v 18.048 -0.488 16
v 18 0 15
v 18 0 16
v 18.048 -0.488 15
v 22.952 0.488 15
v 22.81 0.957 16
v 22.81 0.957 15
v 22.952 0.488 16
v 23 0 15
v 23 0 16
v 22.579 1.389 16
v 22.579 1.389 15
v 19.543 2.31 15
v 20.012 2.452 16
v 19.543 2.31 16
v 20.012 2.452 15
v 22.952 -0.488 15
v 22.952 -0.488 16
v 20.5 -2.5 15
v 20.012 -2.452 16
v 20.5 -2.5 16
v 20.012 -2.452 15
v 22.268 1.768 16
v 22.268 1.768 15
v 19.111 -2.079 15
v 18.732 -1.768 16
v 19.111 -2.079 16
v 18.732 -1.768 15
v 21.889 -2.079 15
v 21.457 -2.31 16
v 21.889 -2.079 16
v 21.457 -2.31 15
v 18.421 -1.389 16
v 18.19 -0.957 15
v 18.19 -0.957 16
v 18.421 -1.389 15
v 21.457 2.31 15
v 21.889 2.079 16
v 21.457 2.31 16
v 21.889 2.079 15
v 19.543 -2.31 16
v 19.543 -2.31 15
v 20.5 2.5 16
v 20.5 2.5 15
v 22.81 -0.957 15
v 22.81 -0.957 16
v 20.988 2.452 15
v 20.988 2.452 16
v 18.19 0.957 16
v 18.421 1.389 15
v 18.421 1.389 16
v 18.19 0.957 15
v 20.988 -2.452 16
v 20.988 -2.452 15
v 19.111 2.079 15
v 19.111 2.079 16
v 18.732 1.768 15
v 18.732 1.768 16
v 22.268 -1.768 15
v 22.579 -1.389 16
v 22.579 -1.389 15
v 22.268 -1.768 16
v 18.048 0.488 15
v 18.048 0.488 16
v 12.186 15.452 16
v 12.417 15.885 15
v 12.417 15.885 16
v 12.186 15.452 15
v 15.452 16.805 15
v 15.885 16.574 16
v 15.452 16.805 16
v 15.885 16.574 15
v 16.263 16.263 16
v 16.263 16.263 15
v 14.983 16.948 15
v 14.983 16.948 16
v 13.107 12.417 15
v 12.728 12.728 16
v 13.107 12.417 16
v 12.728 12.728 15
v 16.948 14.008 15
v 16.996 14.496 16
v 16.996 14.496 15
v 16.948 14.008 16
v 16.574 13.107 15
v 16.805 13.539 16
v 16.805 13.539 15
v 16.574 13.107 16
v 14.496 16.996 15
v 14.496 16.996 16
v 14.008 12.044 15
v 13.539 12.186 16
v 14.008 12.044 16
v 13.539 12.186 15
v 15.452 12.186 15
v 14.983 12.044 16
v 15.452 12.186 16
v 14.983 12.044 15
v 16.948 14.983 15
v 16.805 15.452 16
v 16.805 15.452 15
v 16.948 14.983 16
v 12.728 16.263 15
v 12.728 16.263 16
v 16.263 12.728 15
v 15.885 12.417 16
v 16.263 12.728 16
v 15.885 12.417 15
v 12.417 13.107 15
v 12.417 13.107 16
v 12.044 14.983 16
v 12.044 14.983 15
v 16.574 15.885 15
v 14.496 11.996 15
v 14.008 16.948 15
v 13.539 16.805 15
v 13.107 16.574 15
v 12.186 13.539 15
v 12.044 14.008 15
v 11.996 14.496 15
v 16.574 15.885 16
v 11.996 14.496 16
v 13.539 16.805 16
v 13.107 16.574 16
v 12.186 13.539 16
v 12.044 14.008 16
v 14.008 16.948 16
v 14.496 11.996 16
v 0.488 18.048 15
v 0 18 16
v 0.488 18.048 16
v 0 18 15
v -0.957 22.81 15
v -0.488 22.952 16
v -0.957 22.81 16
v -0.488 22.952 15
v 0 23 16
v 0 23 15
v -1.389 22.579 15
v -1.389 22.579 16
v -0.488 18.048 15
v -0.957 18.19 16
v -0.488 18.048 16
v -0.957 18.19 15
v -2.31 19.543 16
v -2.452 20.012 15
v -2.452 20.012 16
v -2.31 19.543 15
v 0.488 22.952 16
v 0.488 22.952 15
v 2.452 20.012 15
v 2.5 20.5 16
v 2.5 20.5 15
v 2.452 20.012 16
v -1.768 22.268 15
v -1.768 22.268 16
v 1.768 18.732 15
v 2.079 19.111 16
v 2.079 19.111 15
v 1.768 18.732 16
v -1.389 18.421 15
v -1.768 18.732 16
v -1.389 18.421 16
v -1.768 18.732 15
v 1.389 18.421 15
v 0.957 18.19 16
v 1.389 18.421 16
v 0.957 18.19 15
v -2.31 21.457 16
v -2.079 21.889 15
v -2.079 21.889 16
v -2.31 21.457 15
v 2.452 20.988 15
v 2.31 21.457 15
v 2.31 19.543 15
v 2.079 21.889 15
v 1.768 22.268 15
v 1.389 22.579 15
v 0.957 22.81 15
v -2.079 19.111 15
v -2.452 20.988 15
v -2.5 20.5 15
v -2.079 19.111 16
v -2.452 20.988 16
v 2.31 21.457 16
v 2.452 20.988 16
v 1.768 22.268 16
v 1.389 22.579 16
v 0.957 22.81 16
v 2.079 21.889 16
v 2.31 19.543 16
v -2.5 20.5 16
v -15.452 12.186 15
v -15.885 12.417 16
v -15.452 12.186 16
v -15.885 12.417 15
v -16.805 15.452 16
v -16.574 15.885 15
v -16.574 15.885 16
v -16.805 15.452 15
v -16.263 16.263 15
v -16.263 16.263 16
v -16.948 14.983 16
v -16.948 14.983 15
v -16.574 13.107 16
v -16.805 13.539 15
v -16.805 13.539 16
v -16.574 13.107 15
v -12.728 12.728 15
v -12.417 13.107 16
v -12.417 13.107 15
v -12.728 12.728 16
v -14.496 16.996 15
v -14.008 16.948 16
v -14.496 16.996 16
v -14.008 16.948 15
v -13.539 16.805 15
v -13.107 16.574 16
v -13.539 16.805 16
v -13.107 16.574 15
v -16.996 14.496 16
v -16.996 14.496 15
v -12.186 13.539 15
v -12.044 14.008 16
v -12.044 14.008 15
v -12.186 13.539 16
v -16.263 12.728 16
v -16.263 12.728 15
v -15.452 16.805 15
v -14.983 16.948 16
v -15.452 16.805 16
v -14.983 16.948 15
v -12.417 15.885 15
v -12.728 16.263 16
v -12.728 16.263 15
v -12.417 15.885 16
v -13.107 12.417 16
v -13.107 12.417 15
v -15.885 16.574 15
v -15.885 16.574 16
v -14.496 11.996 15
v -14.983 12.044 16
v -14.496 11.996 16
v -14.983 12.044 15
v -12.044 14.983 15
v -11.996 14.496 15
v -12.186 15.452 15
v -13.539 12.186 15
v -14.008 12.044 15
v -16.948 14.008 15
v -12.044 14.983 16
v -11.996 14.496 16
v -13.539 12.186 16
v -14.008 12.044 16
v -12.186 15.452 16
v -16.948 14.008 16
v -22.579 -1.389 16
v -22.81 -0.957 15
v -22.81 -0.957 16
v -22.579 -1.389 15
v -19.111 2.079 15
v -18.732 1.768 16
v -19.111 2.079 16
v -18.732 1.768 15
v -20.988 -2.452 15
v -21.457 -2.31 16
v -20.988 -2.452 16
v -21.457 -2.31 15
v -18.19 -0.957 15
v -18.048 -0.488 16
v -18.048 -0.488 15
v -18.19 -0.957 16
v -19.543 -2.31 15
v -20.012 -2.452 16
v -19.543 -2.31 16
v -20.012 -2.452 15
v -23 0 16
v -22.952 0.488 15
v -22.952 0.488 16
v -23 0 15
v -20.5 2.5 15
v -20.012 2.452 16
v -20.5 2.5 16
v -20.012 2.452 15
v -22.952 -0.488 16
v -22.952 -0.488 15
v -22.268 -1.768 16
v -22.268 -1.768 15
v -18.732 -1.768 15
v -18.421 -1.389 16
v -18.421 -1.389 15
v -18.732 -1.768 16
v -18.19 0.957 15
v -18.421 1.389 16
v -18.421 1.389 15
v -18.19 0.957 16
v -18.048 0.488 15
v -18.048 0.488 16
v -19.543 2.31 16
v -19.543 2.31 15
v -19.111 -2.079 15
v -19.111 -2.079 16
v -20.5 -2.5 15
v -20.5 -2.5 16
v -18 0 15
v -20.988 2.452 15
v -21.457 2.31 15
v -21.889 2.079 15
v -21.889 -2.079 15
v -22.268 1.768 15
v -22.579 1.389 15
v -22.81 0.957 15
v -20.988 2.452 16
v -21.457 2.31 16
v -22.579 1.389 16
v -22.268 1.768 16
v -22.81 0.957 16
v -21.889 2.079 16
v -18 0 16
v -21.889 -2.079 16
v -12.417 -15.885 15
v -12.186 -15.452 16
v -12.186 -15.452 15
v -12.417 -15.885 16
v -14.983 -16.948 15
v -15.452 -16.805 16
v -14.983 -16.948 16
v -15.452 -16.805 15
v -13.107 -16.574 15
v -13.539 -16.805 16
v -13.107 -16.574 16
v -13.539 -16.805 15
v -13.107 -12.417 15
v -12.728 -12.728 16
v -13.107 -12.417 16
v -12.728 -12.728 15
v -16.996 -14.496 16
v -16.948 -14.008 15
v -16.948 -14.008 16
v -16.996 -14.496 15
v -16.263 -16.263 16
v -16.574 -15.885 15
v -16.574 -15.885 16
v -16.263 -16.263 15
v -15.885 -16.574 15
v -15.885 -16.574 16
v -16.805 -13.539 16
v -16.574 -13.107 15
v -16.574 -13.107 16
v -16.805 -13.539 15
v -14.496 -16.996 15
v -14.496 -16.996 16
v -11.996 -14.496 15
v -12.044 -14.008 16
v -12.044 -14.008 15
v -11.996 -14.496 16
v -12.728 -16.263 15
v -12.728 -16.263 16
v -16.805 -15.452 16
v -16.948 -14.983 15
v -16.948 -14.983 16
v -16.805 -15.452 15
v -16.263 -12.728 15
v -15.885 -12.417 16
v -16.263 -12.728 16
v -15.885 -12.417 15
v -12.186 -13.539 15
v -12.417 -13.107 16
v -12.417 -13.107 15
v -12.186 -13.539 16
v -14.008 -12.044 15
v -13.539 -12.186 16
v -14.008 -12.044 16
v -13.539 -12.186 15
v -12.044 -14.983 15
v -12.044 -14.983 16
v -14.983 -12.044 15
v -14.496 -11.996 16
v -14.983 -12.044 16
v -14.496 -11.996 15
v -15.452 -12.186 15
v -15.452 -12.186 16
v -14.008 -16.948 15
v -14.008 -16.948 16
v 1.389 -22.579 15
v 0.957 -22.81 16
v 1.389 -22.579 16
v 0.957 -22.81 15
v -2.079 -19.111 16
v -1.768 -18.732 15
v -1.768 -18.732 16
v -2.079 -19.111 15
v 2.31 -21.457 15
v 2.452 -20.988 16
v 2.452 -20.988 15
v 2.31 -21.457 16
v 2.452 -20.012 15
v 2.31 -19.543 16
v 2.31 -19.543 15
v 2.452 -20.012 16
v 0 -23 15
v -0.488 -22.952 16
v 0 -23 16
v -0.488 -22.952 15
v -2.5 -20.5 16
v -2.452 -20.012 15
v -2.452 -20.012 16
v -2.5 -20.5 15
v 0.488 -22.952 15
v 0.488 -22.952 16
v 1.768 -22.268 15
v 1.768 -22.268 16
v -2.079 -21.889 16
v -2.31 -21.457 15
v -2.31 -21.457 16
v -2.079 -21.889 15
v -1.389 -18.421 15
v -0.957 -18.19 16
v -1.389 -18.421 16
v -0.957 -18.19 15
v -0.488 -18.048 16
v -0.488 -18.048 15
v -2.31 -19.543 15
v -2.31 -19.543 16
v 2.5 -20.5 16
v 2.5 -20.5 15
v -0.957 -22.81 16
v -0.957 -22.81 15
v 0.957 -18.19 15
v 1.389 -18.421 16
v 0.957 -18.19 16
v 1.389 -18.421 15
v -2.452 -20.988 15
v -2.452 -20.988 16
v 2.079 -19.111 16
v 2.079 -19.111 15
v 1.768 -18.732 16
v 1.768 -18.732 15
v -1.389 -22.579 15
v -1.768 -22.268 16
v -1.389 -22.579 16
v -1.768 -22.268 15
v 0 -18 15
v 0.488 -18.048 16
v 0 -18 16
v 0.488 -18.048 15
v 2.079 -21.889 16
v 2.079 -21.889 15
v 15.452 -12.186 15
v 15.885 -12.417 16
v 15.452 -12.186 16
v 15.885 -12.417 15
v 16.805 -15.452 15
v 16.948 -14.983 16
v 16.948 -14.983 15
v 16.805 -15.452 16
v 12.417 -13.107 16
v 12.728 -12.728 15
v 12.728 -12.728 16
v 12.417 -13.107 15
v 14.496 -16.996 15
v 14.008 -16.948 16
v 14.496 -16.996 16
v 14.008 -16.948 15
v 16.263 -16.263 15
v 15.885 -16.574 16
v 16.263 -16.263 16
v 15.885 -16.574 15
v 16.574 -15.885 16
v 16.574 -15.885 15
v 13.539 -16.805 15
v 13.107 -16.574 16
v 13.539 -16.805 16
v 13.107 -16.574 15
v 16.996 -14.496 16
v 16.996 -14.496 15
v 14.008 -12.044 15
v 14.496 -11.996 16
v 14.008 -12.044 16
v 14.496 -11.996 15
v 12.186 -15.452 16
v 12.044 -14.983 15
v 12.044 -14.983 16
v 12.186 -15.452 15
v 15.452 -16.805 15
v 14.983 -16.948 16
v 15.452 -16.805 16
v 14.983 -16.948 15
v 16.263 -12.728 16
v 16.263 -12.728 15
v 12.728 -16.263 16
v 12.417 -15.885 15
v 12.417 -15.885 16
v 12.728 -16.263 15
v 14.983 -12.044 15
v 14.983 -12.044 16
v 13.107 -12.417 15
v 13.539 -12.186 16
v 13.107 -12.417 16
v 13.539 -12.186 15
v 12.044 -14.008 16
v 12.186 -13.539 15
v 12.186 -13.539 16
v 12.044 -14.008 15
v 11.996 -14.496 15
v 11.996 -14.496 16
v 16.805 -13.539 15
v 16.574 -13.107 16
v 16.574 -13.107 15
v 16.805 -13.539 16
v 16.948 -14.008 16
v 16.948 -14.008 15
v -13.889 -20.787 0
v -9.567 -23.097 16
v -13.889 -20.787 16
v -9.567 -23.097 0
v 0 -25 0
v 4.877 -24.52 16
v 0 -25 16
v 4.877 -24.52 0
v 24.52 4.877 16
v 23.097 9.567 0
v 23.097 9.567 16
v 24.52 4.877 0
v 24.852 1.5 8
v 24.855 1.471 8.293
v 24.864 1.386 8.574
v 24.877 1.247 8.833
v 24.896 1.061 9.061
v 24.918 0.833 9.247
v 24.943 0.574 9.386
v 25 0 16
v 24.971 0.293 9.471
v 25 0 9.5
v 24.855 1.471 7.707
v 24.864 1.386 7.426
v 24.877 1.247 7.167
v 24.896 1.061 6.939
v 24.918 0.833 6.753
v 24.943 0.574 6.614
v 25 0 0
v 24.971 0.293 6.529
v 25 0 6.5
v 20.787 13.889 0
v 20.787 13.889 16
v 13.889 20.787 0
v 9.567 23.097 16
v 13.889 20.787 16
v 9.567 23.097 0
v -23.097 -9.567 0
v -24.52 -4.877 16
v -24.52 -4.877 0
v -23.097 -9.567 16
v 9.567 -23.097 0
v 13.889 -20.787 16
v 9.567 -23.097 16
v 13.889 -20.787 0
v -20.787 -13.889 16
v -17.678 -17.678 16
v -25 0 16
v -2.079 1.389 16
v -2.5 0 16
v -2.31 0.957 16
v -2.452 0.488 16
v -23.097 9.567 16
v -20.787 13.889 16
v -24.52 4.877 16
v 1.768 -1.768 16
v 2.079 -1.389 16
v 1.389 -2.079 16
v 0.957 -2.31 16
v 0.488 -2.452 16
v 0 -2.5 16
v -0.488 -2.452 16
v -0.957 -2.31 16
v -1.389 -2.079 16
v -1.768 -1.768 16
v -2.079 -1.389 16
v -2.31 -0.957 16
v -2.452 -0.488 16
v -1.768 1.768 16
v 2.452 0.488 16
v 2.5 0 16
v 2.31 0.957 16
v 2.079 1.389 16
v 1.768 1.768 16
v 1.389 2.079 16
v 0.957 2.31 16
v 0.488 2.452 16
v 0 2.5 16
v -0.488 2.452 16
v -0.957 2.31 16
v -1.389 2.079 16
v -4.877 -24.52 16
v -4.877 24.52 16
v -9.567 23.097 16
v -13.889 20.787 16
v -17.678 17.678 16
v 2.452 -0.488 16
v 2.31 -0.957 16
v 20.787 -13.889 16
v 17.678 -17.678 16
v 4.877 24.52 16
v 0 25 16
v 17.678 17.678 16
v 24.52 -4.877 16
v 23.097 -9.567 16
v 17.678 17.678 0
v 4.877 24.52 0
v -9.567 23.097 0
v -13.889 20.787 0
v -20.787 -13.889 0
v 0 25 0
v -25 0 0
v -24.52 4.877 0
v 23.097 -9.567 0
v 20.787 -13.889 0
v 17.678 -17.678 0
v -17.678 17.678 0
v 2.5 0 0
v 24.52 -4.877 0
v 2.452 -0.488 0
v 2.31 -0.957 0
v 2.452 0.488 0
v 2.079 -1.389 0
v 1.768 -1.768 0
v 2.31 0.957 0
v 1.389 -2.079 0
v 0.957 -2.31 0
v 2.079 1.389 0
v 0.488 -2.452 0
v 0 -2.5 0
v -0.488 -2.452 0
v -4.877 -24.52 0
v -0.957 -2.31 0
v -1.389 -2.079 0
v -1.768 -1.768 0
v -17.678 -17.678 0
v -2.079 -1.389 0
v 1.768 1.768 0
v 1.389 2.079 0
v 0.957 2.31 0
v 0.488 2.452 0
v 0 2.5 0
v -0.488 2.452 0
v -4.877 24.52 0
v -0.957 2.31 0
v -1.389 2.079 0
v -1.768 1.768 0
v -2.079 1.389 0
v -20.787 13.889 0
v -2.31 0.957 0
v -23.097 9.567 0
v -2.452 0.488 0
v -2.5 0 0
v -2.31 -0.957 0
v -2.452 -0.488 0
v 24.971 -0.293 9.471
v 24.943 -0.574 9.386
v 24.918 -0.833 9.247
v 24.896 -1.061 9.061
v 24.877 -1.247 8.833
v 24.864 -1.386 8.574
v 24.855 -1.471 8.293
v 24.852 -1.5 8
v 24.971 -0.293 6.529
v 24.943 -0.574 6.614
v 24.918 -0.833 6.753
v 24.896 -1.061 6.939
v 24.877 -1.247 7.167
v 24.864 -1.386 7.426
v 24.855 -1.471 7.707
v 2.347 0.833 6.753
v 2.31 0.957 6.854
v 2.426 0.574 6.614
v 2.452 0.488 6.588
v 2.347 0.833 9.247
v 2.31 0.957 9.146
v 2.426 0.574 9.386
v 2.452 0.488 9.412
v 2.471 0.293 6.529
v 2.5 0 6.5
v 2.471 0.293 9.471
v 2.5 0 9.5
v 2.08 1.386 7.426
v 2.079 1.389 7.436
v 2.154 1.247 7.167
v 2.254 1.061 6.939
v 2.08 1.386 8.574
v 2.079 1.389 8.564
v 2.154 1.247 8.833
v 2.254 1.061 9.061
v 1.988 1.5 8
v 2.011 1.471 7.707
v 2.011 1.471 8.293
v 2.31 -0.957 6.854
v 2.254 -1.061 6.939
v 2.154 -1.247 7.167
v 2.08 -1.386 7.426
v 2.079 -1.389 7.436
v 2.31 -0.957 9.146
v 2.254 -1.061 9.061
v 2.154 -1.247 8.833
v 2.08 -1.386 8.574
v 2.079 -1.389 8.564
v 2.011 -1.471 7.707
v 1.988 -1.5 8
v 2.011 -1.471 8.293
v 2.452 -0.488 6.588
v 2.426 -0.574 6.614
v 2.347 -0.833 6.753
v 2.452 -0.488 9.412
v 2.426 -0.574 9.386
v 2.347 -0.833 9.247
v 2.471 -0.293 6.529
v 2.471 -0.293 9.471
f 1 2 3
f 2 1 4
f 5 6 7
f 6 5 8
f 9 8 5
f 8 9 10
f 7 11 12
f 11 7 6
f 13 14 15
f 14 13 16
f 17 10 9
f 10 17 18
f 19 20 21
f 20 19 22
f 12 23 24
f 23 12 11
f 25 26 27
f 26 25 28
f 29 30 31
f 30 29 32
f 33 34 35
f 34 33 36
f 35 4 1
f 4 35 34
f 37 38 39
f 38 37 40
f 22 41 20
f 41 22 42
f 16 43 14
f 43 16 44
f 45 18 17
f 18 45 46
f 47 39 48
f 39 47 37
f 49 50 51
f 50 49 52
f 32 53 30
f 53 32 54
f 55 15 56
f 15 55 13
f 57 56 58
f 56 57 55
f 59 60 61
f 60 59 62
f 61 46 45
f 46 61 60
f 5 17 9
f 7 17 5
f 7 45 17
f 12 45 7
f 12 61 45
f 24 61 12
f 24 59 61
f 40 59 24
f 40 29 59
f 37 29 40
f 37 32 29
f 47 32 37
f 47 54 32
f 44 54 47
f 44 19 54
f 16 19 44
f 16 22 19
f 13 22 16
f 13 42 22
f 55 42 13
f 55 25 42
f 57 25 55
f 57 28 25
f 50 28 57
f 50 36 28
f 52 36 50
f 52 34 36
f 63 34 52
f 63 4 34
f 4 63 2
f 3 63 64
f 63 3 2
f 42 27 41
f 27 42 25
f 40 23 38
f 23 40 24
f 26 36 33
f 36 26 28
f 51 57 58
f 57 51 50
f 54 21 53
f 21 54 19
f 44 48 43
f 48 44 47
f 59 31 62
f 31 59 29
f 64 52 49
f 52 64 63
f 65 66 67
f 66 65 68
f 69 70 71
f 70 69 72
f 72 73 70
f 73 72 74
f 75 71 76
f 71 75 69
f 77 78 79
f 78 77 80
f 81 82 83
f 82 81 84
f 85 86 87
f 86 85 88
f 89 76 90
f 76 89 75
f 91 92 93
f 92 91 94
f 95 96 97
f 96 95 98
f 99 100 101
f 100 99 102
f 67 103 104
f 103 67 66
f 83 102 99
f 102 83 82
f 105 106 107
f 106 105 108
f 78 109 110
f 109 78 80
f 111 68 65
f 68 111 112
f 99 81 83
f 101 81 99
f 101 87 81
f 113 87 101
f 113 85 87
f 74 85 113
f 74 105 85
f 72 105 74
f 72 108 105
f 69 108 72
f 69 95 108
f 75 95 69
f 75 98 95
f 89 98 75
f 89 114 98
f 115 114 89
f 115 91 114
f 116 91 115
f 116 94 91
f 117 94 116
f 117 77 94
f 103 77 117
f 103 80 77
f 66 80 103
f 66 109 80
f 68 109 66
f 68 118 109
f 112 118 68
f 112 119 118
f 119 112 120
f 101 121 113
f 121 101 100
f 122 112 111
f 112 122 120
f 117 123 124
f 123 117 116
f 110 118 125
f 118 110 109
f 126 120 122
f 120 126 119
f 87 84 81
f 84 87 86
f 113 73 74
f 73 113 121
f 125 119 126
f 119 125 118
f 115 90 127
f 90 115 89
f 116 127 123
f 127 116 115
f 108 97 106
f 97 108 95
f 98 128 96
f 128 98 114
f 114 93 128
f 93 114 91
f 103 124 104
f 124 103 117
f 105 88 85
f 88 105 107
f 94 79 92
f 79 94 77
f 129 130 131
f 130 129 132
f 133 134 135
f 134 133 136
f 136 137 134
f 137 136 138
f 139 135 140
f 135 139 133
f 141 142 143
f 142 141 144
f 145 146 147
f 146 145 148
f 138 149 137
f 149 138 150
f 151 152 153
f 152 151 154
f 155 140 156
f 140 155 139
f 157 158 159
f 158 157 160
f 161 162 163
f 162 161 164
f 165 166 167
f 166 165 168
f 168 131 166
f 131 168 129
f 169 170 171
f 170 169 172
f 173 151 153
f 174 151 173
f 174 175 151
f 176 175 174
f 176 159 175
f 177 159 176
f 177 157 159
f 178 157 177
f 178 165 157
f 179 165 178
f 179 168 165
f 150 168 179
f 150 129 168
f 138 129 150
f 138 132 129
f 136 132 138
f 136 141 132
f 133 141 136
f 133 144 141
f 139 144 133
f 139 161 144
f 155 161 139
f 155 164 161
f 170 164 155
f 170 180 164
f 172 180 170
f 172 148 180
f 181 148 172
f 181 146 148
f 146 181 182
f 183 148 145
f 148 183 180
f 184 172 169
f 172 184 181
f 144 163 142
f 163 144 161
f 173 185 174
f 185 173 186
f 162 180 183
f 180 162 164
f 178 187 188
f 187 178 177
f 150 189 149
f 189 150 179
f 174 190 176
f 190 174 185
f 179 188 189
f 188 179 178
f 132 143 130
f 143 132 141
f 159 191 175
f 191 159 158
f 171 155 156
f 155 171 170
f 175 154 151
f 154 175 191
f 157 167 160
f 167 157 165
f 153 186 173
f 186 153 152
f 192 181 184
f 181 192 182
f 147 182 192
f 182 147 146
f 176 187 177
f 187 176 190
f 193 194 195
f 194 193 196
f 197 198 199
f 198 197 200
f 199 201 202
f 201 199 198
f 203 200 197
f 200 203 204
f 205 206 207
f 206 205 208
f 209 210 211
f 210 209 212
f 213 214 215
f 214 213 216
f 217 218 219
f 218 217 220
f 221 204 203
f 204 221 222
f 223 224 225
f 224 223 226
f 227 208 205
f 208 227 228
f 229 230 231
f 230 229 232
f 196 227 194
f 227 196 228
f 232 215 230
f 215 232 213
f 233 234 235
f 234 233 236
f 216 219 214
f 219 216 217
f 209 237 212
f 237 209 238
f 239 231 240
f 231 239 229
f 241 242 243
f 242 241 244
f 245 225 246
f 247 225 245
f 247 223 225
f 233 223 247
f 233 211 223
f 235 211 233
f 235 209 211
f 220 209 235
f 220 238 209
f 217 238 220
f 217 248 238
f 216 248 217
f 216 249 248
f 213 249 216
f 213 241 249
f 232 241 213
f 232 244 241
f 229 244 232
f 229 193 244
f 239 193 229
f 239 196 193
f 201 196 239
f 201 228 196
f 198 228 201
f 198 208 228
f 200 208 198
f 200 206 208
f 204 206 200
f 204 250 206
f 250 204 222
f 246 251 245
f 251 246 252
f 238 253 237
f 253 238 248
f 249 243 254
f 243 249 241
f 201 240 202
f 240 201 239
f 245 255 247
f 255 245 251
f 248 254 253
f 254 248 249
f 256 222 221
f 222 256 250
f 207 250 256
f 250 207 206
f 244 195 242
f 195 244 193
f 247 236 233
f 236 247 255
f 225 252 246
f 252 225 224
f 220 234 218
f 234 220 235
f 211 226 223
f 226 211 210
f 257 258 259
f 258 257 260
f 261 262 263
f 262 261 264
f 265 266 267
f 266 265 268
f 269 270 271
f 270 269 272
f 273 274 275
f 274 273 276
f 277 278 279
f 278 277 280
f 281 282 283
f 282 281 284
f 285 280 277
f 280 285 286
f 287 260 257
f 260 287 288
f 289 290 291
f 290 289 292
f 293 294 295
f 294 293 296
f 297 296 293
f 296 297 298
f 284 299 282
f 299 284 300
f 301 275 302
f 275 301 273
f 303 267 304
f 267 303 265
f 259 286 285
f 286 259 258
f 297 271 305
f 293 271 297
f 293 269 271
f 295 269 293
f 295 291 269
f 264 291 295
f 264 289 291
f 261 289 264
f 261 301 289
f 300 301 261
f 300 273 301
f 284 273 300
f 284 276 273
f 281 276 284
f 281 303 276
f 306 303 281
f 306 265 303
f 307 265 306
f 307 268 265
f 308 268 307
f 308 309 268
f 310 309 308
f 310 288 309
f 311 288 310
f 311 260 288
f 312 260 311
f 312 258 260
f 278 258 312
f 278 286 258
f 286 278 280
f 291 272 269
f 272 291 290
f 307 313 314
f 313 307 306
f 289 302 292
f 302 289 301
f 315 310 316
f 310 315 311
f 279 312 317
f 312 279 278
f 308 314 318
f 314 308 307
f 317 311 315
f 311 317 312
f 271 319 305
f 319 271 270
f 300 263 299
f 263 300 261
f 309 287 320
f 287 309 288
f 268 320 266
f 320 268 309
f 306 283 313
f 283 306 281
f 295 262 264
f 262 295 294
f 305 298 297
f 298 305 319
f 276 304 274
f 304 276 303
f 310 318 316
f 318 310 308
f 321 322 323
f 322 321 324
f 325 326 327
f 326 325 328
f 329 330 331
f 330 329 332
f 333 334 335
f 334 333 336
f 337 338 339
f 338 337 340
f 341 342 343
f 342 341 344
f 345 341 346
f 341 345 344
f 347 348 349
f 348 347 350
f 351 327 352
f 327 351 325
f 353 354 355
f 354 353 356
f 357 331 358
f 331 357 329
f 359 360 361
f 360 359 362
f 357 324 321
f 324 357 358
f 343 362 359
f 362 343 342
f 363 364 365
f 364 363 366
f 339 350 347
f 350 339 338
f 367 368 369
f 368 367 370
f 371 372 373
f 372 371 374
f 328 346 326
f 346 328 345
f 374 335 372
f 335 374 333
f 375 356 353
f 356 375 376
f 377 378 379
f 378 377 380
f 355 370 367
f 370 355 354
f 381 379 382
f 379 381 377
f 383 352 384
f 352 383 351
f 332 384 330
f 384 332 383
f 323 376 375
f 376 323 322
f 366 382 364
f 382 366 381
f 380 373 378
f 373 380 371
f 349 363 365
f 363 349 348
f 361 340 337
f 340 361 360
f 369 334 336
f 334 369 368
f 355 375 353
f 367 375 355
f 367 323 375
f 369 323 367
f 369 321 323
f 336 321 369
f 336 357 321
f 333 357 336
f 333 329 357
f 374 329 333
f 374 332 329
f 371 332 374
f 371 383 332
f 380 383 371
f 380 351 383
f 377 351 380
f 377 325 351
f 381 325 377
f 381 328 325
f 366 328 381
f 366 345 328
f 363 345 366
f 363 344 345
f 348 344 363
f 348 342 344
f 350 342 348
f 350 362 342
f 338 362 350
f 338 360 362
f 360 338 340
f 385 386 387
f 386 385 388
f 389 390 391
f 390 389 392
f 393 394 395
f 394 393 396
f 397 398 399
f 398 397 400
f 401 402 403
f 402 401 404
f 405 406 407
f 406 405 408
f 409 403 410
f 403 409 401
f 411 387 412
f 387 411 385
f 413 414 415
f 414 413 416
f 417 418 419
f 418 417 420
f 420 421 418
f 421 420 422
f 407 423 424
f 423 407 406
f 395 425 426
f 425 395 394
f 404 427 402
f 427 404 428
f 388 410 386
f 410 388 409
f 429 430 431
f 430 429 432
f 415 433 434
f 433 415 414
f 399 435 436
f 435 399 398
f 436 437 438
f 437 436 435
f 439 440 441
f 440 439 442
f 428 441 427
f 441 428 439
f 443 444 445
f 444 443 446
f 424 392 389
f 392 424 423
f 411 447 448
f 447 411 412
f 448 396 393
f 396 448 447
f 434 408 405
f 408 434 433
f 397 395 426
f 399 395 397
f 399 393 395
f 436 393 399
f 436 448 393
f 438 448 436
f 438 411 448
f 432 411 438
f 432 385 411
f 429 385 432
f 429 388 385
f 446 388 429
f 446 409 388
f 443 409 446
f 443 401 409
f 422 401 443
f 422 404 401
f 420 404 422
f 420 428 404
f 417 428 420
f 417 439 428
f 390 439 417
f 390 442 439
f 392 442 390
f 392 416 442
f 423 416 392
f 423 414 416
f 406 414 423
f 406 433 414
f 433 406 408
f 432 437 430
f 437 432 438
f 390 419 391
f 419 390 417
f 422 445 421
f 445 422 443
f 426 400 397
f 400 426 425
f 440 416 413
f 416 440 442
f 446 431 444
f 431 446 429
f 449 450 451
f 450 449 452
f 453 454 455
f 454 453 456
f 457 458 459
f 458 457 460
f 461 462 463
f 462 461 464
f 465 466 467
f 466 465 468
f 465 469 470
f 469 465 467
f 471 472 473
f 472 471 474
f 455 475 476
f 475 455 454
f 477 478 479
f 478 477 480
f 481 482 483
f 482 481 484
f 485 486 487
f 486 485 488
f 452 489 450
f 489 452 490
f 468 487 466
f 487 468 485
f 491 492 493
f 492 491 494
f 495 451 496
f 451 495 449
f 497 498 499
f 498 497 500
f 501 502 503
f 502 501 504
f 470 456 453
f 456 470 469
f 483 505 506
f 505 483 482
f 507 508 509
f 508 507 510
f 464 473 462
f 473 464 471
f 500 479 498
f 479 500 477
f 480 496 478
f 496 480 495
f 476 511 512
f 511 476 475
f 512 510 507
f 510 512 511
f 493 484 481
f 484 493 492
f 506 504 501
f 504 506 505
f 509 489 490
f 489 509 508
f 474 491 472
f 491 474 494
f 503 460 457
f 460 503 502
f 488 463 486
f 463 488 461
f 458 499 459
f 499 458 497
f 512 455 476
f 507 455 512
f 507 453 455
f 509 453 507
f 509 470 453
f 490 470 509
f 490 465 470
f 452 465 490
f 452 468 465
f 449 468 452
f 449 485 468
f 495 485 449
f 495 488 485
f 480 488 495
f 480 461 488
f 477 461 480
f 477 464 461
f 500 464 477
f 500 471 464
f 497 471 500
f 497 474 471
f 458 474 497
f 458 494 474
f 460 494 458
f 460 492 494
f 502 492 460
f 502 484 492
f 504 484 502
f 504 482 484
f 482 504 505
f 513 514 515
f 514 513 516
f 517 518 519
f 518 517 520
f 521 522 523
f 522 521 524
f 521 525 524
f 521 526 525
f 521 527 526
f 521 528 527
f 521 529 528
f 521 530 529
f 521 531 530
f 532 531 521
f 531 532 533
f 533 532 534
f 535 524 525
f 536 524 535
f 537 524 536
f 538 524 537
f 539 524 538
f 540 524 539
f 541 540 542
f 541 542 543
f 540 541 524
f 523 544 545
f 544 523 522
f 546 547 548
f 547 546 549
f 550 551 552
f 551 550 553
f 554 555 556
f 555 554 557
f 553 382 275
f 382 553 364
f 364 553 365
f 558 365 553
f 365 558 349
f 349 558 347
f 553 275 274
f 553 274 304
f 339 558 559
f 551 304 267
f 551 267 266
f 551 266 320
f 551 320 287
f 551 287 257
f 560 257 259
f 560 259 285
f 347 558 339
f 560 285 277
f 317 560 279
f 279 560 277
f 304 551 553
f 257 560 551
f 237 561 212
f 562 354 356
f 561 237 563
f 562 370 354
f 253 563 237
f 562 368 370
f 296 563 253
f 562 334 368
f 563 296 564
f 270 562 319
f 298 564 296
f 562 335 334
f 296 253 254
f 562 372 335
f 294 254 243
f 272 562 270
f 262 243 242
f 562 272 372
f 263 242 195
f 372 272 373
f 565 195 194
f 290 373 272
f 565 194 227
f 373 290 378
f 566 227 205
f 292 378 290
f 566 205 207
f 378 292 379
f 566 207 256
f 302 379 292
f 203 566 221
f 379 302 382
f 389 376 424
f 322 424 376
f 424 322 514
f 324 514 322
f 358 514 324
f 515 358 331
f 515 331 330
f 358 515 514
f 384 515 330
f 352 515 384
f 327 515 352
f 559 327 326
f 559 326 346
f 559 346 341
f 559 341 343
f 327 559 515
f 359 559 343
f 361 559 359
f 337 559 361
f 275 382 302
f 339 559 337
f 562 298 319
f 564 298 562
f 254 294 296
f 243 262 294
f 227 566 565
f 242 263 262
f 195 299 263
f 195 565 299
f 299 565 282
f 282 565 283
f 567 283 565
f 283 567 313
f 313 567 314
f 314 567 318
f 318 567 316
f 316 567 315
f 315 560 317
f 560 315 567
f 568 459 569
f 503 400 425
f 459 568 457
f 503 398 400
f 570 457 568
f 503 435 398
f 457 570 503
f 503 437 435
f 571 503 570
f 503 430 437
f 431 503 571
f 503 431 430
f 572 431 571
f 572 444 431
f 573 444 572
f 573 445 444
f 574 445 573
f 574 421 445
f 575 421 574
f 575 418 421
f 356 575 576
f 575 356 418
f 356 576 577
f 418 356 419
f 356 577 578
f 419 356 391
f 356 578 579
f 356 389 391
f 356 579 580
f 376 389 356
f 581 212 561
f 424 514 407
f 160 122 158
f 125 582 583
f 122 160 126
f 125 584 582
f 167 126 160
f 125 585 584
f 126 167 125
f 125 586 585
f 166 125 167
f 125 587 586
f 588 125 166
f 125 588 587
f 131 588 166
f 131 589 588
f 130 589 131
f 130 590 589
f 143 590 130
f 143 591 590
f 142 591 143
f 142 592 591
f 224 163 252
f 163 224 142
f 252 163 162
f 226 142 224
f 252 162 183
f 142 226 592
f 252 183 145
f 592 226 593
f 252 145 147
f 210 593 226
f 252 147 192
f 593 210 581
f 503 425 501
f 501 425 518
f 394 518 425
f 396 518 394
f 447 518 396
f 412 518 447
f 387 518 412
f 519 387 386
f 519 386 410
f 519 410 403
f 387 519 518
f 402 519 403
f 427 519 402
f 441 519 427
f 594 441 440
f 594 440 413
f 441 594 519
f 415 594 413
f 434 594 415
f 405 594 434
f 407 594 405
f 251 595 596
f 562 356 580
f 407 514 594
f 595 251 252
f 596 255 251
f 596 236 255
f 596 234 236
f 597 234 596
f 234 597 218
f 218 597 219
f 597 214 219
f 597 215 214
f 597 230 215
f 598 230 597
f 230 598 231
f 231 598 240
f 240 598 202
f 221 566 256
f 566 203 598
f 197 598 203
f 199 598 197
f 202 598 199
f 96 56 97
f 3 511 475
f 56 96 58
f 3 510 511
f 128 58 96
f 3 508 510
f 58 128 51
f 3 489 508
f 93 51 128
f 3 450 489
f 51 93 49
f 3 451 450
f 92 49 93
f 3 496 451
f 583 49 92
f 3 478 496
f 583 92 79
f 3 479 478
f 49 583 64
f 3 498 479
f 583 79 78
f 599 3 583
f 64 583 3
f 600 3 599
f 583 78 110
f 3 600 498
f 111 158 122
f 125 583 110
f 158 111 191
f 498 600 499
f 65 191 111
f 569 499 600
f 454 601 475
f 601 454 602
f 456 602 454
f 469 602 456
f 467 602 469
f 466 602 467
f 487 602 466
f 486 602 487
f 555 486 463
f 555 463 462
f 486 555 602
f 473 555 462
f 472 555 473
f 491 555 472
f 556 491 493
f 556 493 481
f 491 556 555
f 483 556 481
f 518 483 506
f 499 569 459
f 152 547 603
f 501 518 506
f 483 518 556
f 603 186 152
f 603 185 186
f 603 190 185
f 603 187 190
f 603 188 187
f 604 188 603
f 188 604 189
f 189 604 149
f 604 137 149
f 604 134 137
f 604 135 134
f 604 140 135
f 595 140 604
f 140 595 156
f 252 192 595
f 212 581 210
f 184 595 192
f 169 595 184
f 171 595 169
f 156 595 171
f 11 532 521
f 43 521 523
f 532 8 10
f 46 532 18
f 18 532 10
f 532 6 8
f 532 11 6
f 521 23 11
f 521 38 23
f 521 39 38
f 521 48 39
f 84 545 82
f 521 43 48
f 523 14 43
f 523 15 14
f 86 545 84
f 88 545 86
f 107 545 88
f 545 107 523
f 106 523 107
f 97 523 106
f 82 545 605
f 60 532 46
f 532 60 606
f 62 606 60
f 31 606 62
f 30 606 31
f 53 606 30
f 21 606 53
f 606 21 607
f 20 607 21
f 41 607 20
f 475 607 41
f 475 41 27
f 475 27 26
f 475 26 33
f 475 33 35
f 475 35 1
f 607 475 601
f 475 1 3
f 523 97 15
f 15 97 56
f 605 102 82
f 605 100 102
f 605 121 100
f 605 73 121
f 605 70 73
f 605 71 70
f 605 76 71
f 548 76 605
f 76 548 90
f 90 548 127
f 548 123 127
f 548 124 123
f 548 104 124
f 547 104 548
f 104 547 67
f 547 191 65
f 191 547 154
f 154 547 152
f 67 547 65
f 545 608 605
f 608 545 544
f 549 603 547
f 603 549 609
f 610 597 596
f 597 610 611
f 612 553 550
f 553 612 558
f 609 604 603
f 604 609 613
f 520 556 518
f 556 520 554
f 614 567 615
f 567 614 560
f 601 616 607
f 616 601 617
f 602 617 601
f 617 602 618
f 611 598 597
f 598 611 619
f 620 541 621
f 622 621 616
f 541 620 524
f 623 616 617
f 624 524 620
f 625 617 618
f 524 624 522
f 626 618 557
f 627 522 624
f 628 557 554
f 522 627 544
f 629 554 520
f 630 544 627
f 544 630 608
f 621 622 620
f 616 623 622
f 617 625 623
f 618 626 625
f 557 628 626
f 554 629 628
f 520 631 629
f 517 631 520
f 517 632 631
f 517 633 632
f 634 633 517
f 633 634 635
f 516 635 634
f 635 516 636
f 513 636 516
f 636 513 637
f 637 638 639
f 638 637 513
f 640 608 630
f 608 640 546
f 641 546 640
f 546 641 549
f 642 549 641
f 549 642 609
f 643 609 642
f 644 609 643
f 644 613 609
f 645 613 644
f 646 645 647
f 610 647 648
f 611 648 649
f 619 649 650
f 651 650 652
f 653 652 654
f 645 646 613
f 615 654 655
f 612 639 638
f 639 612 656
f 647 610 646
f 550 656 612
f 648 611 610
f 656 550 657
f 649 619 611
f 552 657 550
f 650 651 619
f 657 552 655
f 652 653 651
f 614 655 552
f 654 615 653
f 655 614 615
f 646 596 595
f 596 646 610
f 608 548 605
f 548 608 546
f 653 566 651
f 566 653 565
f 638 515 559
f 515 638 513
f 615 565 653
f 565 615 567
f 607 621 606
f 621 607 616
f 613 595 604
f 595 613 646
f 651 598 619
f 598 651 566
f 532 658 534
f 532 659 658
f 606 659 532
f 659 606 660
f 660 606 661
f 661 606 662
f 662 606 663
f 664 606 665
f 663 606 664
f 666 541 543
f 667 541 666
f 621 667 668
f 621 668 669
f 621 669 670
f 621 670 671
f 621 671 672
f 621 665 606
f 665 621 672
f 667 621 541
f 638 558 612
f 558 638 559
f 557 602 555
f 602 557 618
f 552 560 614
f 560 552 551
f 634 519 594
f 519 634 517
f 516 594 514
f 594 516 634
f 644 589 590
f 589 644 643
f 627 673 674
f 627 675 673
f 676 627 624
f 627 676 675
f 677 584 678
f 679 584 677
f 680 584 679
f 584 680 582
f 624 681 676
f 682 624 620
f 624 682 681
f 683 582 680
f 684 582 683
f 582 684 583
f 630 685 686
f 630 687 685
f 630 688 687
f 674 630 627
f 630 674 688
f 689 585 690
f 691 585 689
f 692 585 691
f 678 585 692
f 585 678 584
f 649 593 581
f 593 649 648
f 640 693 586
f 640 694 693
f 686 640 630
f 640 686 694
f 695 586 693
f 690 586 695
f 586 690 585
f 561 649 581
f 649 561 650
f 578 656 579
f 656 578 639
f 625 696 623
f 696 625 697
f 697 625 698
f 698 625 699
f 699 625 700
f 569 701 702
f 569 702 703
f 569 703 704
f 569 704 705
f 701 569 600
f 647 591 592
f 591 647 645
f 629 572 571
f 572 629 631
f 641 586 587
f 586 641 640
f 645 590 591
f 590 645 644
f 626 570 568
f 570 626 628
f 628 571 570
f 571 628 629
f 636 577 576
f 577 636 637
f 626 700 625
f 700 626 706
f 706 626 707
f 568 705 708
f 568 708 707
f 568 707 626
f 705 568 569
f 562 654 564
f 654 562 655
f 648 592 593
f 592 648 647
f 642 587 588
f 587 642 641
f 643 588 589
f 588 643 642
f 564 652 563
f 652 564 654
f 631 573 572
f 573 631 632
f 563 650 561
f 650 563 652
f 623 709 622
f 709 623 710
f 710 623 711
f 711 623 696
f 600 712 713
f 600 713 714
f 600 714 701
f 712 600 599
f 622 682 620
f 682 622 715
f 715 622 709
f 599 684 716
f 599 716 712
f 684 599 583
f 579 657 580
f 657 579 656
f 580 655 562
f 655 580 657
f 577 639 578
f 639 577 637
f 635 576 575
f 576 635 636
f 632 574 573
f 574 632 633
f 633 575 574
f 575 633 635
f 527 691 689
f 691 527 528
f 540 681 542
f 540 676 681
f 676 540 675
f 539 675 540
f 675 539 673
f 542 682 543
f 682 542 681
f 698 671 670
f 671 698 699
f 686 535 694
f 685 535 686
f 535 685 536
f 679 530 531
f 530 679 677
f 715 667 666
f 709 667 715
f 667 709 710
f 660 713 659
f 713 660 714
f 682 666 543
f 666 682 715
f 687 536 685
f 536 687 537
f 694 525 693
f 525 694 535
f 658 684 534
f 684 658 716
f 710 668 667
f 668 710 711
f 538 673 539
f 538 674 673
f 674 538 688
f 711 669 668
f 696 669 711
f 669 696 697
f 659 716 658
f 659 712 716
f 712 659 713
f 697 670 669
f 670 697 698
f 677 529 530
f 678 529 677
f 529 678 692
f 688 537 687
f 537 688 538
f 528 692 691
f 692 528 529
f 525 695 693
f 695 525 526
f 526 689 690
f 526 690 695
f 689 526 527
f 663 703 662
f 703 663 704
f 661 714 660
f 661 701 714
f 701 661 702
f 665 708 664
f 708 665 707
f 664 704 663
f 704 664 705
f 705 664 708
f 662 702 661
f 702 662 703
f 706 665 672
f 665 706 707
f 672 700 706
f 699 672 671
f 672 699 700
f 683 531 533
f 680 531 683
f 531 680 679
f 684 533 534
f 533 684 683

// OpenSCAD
$fn = 32;

// ----------------------------------------------------------------------
// Control knob: dimpled knob
// ----------------------------------------------------------------------

// --- parameters (mm) ---
dimp_d = 5;               // finger dimple diameter
n_dimp = 8;               // number of dimples
dimp_r = 20.5;            // dimple ring radius
knob_d = 50;              // knob body diameter
knob_h = 16;              // knob body height
bore_d = 5;               // shaft bore diameter
set_d = 3;                // set screw bore diameter

dimp_step = 360 / n_dimp;  // dimple angular step

difference() {
  cylinder(h = knob_h, d = knob_d);
  translate([0, 0, -1]) cylinder(h = knob_h + 2, d = bore_d);
  translate([-1, 0, knob_h / 2]) rotate([0, 90, 0])
    cylinder(h = knob_d / 2 + bore_d / 2 + 2, d = set_d);  for (i = [0 : n_dimp - 1])
    rotate([0, 0, i * dimp_step])
      translate([dimp_r, 0, knob_h - 1])
        cylinder(h = 2, d = dimp_d);
}
